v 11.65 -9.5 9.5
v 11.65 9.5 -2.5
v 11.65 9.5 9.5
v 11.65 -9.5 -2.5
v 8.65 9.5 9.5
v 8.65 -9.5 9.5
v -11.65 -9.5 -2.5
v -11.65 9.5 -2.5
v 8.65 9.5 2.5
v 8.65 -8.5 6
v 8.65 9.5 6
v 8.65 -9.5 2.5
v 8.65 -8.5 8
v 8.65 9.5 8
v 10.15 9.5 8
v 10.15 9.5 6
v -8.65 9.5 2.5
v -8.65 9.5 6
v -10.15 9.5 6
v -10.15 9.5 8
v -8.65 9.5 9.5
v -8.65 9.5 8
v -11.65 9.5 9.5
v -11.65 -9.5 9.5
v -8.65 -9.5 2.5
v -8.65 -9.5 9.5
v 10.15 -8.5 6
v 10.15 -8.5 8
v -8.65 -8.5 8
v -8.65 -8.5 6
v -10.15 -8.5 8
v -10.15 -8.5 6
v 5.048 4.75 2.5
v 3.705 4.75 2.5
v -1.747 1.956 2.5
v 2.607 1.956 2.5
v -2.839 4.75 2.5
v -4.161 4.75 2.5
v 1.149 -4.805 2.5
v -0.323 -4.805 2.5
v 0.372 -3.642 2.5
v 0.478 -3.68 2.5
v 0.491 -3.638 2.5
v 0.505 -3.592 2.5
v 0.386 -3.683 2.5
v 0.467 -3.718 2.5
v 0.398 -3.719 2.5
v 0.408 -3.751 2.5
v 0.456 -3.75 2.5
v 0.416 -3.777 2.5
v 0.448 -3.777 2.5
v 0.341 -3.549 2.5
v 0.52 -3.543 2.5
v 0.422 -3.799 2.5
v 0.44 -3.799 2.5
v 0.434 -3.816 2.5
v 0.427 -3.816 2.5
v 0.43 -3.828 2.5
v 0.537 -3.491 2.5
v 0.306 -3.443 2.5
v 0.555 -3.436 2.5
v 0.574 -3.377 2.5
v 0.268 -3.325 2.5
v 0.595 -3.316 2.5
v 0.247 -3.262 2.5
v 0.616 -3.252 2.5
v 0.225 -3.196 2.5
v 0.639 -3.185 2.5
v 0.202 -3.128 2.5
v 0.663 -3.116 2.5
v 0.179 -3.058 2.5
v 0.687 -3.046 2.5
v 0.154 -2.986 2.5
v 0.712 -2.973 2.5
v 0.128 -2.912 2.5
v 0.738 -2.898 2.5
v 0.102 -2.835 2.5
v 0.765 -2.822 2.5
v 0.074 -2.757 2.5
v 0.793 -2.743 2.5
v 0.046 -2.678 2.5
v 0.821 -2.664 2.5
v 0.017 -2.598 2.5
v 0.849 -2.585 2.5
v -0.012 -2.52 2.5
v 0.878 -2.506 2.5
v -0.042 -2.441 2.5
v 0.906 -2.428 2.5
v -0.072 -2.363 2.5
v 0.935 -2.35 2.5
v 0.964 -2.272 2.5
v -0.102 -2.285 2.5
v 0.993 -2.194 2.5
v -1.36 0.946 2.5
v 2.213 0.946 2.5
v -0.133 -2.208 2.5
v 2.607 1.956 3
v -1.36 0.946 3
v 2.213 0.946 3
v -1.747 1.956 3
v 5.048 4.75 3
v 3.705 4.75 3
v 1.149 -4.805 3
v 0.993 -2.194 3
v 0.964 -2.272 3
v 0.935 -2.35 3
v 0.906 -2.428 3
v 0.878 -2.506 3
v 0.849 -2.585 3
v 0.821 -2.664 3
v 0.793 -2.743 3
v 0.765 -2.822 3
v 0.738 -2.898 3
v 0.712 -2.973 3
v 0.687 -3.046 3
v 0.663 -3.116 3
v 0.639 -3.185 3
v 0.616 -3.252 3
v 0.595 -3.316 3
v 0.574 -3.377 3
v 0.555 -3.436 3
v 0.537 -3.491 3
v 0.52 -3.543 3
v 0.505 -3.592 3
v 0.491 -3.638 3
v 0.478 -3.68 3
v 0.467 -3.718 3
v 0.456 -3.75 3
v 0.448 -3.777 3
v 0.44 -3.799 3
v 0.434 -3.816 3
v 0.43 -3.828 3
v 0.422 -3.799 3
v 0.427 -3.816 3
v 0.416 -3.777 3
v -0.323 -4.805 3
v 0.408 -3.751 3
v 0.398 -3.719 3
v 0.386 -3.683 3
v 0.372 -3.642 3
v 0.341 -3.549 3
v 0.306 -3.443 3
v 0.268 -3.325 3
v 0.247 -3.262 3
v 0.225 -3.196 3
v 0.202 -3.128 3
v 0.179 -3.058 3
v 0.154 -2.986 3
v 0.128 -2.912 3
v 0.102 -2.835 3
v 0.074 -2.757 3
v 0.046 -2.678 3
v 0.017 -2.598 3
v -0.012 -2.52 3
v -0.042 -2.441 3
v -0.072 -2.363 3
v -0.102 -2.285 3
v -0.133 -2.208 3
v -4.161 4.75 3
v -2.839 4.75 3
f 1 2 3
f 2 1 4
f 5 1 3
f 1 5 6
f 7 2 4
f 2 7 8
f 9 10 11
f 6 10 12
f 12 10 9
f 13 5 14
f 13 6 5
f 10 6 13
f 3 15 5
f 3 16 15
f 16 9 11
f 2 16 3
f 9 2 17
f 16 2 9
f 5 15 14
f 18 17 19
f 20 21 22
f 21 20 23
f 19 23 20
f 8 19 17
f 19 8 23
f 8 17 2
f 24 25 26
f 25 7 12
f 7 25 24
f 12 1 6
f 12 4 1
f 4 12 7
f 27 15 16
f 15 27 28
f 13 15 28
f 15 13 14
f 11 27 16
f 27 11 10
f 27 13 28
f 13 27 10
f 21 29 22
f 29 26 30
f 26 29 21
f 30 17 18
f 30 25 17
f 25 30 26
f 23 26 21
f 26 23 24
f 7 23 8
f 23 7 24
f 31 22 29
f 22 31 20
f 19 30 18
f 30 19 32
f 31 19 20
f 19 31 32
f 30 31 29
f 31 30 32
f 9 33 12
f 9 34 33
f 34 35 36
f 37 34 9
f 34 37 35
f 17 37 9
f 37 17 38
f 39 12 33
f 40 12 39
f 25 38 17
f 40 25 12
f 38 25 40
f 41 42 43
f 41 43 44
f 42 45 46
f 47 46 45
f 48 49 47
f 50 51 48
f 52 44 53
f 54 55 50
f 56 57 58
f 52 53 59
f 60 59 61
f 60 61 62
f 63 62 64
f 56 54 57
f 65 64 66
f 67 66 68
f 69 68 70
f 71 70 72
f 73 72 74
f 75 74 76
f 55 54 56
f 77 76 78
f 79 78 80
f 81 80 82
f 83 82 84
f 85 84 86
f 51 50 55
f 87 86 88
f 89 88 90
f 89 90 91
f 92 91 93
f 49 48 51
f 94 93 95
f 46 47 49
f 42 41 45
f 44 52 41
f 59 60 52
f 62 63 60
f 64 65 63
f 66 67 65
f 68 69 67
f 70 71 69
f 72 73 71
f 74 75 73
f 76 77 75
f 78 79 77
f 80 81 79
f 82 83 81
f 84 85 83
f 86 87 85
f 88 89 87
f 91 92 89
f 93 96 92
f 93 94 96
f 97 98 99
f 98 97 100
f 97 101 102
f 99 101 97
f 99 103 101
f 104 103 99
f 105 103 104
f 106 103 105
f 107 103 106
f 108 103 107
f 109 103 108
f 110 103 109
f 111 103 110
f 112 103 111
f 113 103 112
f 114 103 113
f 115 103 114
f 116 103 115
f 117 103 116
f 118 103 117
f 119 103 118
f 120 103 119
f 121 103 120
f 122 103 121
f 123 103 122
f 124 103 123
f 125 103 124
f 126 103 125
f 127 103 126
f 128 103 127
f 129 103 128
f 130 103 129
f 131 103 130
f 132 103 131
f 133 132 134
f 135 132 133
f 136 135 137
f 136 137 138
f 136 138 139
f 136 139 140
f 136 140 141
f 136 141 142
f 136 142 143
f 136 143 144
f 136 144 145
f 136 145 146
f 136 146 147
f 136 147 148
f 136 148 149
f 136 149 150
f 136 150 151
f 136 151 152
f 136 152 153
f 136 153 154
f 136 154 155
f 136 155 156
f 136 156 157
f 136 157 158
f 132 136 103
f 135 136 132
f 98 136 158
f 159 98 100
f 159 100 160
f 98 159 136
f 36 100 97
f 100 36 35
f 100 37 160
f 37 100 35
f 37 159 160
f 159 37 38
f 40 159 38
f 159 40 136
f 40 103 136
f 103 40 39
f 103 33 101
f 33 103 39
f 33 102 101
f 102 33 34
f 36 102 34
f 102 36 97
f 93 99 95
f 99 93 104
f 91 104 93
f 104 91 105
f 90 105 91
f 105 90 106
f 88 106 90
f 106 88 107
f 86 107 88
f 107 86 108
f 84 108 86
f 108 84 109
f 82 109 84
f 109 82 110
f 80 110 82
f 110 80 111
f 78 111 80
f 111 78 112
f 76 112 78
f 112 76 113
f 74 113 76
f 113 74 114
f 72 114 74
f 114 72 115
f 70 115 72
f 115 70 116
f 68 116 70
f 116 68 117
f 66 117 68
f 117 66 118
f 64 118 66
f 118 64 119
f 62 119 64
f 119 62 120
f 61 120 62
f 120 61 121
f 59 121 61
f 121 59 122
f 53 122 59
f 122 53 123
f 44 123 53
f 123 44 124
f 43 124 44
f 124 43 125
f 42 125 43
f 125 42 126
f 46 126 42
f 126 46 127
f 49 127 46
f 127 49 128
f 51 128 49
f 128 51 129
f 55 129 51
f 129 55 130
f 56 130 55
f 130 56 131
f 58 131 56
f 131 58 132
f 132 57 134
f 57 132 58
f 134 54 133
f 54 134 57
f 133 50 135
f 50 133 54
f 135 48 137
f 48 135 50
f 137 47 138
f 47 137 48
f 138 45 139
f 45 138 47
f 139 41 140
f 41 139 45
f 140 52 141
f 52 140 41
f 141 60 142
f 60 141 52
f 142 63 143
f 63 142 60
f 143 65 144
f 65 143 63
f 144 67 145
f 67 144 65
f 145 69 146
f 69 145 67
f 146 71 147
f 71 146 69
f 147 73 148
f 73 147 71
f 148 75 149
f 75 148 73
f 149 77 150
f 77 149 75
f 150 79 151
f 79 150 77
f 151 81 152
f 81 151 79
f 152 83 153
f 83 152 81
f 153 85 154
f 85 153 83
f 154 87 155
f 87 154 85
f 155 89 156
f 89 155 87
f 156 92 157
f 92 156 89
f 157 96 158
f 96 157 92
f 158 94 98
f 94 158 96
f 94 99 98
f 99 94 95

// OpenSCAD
// file: ../robot_settings.scad
main_box_x = 95; // 96
main_box_y = 102;
main_box_z = 74; // 74.5
wall_thickness = 2;

rail_gap = 2;
rail_inset = 7;

rail_thickness = 7;
rail_length = 250;
rail_width = 200;

raspberry_pi_screw_seperation_y = 57;
raspberry_pi_screw_seperation_z = 48;
raspberry_pi_peg_h = 4;

gears_module = 1;
pinion_gear_teeth = 30;
pinion_gear_width = 5;
pinion_gear_bore = 4;

gears_setback_distance = 25;
gear_post_height = 2 * pinion_gear_width + rail_thickness + 8 ;

steering_motor_mount_x = 45;
steering_motor_mount_y = 36;
steering_motor_mount_z = 18;
steering_motor_mount_setback_distance = gears_setback_distance + 16;

dc_motor_drivertype = "Teyleten"; // Teyleten
isAdafruit = (dc_motor_drivertype == "Adafruit");

drv8871_x = isAdafruit ? 20.3 : 21.6;
drv8871_y = isAdafruit ?  24 : 25;

drv8871_z = 2;
drv8871_screw_d = 2.5;
drv8871_solder_points_z = 2;

drv8871mount_edge_x = 1.5;
drv8871mount_edge_wall = 3;
drv8871mount_z = 5;
drv8871mount_x = drv8871_x +  drv8871mount_edge_wall - 2* drv8871mount_edge_x;
drv8871mount_y = 19;

drv8871_screw_distance = 15.64;
drv8871_solder_points_d = 1.66;
drv8871_solder_offset_y = 4.4;
drv8871_solder_inner_points_distance = 5;
drv8871_solder_outer_points_distance = 12;

dc_motor_housing_minus_encoder_z = 48;
dc_motor_encoder_z = 9.33;
dc_motor_encoder_wheel_d = 13.4;
dc_motor_encoder_wheel_thickness = 5;
dc_motor_encoder_wheel_gap = 3;
dc_motor_encoder_circuit_thickness = 2;
dc_motor_cutout_d = 24.8;
dc_motor_cutout_z = 19.5;

dc_motor_screw_head_z = 2;
dc_motor_screw_head_d = 5.6;
dc_motor_screw_d = 3.2;
dc_motor_screw_offset = 8.5;

dc_motor_axle_ring_z = 3;
dc_motor_axle_ring_d = 7.2;
dc_motor_axle_cutout_d = 4.5;
dc_motor_axle_cutout_z = 10;
dc_motor_axle_notch_cutout = 0.4;
dc_motor_axle_notch_cutout_z = 6;

pdmount_x = 20;
pdmount_y = 30;
pdmount_z = 2;
pdmount_edge_x = 1.5;
pdmount_edge_wall = 3;

steering_shaft_z = gear_post_height + dc_motor_axle_ring_z + pinion_gear_width + 15;
steering_shaft_d = 7;
steering_shaft_motor_fitting_d = 9;

lidar_mount_y = 110;
lidar_mount_x = 65 + 20;
lidar_narrow_screws = 40;
lidar_wide_screws = 56;
lidar_front_to_back_screws = 70;
lidar_screw_d = 3;
lidar_circuitboard_x = 20;
lidar_circuitboard_y = 35;
lidar_circuitboard_z = 1.2;
lidar_cord_length = 55;

ball_bearing_height = 7;
ball_bearing_outer_diameter = 22;
ball_bearing_inner_diameter = 8;

pull_bar_radius = 3.3;

rack_module = 1;
rack_length = main_box_x / 2;
rack_height = 10;
rack_width = 10;
rack_teeth = 30;
rack_bore = 3;

// tire hardware
axle_length = 30;
axle_reciever_inner_diameter = 7.75;
axle_reciever_length = 18.8;
axle_notch_length = 7;
axle_notch_cutout = 2.4;

// power distribution bar
power_bar_cutout_x = 96;
power_bar_y = 19.1;
power_bar_z = 1.5;
power_bar_screw_distance = 91.4;
power_bar_screw_d = 2.8;
power_bar_standoff_z = 5;
power_bar_standoff_d = 6.83;

// breadboard
breadboard_wall_thickness = 3;
breadboard_width = 55;
breadboard_length = 83;
breadboard_height = 10.5;
breadboard_notch_width = 3.8;
breadboard_longside_notch_separation = 58.2 - breadboard_notch_width / 2;
breadboard_shortside_notch_separation = 26.3 - breadboard_notch_width;
// main file
include <../robot_settings.scad>

$fn = 50;

module drv8871mount(dc_motor_drivertype = "Adafruit")
{
  ///////////
  // these are also in robot_settings due to dependency
  isAdafruit = (dc_motor_drivertype == "Adafruit");

  drv8871_x = isAdafruit ? 20.3 : 21.6;
  drv8871_y = isAdafruit ?  24 : 25;
  drv8871mount_x = drv8871_x +  drv8871mount_edge_wall - 2* drv8871mount_edge_x;
  displayLetter = isAdafruit ? "A" : "T";
  ///////////
  
  cube([drv8871mount_x, drv8871mount_y, drv8871mount_z], center = true);
  
  difference() {
    translate([drv8871mount_x / 2, 0, 3.5])
    cube([drv8871mount_edge_wall, drv8871mount_y, drv8871mount_z + 7], center = true);
    
    translate([0, 1, drv8871mount_z + drv8871_solder_points_z])
    cube([drv8871mount_x, drv8871mount_y, drv8871_z], center = true);
  }
       
  translate([drv8871mount_x / 4, drv8871mount_y / 4, 2])
  color("blue")
  rotate([0,0,180])
  linear_extrude(1)
  text(displayLetter);
  
  difference() {
  translate([-drv8871mount_x / 2, 0, 3.5])
  cube([drv8871mount_edge_wall, drv8871mount_y, drv8871mount_z + 7], center = true);
  
  translate([0, 1, drv8871mount_z + drv8871_solder_points_z])
  cube([drv8871mount_x, drv8871mount_y, drv8871_z], center = true);
  }
}

drv8871mount();
